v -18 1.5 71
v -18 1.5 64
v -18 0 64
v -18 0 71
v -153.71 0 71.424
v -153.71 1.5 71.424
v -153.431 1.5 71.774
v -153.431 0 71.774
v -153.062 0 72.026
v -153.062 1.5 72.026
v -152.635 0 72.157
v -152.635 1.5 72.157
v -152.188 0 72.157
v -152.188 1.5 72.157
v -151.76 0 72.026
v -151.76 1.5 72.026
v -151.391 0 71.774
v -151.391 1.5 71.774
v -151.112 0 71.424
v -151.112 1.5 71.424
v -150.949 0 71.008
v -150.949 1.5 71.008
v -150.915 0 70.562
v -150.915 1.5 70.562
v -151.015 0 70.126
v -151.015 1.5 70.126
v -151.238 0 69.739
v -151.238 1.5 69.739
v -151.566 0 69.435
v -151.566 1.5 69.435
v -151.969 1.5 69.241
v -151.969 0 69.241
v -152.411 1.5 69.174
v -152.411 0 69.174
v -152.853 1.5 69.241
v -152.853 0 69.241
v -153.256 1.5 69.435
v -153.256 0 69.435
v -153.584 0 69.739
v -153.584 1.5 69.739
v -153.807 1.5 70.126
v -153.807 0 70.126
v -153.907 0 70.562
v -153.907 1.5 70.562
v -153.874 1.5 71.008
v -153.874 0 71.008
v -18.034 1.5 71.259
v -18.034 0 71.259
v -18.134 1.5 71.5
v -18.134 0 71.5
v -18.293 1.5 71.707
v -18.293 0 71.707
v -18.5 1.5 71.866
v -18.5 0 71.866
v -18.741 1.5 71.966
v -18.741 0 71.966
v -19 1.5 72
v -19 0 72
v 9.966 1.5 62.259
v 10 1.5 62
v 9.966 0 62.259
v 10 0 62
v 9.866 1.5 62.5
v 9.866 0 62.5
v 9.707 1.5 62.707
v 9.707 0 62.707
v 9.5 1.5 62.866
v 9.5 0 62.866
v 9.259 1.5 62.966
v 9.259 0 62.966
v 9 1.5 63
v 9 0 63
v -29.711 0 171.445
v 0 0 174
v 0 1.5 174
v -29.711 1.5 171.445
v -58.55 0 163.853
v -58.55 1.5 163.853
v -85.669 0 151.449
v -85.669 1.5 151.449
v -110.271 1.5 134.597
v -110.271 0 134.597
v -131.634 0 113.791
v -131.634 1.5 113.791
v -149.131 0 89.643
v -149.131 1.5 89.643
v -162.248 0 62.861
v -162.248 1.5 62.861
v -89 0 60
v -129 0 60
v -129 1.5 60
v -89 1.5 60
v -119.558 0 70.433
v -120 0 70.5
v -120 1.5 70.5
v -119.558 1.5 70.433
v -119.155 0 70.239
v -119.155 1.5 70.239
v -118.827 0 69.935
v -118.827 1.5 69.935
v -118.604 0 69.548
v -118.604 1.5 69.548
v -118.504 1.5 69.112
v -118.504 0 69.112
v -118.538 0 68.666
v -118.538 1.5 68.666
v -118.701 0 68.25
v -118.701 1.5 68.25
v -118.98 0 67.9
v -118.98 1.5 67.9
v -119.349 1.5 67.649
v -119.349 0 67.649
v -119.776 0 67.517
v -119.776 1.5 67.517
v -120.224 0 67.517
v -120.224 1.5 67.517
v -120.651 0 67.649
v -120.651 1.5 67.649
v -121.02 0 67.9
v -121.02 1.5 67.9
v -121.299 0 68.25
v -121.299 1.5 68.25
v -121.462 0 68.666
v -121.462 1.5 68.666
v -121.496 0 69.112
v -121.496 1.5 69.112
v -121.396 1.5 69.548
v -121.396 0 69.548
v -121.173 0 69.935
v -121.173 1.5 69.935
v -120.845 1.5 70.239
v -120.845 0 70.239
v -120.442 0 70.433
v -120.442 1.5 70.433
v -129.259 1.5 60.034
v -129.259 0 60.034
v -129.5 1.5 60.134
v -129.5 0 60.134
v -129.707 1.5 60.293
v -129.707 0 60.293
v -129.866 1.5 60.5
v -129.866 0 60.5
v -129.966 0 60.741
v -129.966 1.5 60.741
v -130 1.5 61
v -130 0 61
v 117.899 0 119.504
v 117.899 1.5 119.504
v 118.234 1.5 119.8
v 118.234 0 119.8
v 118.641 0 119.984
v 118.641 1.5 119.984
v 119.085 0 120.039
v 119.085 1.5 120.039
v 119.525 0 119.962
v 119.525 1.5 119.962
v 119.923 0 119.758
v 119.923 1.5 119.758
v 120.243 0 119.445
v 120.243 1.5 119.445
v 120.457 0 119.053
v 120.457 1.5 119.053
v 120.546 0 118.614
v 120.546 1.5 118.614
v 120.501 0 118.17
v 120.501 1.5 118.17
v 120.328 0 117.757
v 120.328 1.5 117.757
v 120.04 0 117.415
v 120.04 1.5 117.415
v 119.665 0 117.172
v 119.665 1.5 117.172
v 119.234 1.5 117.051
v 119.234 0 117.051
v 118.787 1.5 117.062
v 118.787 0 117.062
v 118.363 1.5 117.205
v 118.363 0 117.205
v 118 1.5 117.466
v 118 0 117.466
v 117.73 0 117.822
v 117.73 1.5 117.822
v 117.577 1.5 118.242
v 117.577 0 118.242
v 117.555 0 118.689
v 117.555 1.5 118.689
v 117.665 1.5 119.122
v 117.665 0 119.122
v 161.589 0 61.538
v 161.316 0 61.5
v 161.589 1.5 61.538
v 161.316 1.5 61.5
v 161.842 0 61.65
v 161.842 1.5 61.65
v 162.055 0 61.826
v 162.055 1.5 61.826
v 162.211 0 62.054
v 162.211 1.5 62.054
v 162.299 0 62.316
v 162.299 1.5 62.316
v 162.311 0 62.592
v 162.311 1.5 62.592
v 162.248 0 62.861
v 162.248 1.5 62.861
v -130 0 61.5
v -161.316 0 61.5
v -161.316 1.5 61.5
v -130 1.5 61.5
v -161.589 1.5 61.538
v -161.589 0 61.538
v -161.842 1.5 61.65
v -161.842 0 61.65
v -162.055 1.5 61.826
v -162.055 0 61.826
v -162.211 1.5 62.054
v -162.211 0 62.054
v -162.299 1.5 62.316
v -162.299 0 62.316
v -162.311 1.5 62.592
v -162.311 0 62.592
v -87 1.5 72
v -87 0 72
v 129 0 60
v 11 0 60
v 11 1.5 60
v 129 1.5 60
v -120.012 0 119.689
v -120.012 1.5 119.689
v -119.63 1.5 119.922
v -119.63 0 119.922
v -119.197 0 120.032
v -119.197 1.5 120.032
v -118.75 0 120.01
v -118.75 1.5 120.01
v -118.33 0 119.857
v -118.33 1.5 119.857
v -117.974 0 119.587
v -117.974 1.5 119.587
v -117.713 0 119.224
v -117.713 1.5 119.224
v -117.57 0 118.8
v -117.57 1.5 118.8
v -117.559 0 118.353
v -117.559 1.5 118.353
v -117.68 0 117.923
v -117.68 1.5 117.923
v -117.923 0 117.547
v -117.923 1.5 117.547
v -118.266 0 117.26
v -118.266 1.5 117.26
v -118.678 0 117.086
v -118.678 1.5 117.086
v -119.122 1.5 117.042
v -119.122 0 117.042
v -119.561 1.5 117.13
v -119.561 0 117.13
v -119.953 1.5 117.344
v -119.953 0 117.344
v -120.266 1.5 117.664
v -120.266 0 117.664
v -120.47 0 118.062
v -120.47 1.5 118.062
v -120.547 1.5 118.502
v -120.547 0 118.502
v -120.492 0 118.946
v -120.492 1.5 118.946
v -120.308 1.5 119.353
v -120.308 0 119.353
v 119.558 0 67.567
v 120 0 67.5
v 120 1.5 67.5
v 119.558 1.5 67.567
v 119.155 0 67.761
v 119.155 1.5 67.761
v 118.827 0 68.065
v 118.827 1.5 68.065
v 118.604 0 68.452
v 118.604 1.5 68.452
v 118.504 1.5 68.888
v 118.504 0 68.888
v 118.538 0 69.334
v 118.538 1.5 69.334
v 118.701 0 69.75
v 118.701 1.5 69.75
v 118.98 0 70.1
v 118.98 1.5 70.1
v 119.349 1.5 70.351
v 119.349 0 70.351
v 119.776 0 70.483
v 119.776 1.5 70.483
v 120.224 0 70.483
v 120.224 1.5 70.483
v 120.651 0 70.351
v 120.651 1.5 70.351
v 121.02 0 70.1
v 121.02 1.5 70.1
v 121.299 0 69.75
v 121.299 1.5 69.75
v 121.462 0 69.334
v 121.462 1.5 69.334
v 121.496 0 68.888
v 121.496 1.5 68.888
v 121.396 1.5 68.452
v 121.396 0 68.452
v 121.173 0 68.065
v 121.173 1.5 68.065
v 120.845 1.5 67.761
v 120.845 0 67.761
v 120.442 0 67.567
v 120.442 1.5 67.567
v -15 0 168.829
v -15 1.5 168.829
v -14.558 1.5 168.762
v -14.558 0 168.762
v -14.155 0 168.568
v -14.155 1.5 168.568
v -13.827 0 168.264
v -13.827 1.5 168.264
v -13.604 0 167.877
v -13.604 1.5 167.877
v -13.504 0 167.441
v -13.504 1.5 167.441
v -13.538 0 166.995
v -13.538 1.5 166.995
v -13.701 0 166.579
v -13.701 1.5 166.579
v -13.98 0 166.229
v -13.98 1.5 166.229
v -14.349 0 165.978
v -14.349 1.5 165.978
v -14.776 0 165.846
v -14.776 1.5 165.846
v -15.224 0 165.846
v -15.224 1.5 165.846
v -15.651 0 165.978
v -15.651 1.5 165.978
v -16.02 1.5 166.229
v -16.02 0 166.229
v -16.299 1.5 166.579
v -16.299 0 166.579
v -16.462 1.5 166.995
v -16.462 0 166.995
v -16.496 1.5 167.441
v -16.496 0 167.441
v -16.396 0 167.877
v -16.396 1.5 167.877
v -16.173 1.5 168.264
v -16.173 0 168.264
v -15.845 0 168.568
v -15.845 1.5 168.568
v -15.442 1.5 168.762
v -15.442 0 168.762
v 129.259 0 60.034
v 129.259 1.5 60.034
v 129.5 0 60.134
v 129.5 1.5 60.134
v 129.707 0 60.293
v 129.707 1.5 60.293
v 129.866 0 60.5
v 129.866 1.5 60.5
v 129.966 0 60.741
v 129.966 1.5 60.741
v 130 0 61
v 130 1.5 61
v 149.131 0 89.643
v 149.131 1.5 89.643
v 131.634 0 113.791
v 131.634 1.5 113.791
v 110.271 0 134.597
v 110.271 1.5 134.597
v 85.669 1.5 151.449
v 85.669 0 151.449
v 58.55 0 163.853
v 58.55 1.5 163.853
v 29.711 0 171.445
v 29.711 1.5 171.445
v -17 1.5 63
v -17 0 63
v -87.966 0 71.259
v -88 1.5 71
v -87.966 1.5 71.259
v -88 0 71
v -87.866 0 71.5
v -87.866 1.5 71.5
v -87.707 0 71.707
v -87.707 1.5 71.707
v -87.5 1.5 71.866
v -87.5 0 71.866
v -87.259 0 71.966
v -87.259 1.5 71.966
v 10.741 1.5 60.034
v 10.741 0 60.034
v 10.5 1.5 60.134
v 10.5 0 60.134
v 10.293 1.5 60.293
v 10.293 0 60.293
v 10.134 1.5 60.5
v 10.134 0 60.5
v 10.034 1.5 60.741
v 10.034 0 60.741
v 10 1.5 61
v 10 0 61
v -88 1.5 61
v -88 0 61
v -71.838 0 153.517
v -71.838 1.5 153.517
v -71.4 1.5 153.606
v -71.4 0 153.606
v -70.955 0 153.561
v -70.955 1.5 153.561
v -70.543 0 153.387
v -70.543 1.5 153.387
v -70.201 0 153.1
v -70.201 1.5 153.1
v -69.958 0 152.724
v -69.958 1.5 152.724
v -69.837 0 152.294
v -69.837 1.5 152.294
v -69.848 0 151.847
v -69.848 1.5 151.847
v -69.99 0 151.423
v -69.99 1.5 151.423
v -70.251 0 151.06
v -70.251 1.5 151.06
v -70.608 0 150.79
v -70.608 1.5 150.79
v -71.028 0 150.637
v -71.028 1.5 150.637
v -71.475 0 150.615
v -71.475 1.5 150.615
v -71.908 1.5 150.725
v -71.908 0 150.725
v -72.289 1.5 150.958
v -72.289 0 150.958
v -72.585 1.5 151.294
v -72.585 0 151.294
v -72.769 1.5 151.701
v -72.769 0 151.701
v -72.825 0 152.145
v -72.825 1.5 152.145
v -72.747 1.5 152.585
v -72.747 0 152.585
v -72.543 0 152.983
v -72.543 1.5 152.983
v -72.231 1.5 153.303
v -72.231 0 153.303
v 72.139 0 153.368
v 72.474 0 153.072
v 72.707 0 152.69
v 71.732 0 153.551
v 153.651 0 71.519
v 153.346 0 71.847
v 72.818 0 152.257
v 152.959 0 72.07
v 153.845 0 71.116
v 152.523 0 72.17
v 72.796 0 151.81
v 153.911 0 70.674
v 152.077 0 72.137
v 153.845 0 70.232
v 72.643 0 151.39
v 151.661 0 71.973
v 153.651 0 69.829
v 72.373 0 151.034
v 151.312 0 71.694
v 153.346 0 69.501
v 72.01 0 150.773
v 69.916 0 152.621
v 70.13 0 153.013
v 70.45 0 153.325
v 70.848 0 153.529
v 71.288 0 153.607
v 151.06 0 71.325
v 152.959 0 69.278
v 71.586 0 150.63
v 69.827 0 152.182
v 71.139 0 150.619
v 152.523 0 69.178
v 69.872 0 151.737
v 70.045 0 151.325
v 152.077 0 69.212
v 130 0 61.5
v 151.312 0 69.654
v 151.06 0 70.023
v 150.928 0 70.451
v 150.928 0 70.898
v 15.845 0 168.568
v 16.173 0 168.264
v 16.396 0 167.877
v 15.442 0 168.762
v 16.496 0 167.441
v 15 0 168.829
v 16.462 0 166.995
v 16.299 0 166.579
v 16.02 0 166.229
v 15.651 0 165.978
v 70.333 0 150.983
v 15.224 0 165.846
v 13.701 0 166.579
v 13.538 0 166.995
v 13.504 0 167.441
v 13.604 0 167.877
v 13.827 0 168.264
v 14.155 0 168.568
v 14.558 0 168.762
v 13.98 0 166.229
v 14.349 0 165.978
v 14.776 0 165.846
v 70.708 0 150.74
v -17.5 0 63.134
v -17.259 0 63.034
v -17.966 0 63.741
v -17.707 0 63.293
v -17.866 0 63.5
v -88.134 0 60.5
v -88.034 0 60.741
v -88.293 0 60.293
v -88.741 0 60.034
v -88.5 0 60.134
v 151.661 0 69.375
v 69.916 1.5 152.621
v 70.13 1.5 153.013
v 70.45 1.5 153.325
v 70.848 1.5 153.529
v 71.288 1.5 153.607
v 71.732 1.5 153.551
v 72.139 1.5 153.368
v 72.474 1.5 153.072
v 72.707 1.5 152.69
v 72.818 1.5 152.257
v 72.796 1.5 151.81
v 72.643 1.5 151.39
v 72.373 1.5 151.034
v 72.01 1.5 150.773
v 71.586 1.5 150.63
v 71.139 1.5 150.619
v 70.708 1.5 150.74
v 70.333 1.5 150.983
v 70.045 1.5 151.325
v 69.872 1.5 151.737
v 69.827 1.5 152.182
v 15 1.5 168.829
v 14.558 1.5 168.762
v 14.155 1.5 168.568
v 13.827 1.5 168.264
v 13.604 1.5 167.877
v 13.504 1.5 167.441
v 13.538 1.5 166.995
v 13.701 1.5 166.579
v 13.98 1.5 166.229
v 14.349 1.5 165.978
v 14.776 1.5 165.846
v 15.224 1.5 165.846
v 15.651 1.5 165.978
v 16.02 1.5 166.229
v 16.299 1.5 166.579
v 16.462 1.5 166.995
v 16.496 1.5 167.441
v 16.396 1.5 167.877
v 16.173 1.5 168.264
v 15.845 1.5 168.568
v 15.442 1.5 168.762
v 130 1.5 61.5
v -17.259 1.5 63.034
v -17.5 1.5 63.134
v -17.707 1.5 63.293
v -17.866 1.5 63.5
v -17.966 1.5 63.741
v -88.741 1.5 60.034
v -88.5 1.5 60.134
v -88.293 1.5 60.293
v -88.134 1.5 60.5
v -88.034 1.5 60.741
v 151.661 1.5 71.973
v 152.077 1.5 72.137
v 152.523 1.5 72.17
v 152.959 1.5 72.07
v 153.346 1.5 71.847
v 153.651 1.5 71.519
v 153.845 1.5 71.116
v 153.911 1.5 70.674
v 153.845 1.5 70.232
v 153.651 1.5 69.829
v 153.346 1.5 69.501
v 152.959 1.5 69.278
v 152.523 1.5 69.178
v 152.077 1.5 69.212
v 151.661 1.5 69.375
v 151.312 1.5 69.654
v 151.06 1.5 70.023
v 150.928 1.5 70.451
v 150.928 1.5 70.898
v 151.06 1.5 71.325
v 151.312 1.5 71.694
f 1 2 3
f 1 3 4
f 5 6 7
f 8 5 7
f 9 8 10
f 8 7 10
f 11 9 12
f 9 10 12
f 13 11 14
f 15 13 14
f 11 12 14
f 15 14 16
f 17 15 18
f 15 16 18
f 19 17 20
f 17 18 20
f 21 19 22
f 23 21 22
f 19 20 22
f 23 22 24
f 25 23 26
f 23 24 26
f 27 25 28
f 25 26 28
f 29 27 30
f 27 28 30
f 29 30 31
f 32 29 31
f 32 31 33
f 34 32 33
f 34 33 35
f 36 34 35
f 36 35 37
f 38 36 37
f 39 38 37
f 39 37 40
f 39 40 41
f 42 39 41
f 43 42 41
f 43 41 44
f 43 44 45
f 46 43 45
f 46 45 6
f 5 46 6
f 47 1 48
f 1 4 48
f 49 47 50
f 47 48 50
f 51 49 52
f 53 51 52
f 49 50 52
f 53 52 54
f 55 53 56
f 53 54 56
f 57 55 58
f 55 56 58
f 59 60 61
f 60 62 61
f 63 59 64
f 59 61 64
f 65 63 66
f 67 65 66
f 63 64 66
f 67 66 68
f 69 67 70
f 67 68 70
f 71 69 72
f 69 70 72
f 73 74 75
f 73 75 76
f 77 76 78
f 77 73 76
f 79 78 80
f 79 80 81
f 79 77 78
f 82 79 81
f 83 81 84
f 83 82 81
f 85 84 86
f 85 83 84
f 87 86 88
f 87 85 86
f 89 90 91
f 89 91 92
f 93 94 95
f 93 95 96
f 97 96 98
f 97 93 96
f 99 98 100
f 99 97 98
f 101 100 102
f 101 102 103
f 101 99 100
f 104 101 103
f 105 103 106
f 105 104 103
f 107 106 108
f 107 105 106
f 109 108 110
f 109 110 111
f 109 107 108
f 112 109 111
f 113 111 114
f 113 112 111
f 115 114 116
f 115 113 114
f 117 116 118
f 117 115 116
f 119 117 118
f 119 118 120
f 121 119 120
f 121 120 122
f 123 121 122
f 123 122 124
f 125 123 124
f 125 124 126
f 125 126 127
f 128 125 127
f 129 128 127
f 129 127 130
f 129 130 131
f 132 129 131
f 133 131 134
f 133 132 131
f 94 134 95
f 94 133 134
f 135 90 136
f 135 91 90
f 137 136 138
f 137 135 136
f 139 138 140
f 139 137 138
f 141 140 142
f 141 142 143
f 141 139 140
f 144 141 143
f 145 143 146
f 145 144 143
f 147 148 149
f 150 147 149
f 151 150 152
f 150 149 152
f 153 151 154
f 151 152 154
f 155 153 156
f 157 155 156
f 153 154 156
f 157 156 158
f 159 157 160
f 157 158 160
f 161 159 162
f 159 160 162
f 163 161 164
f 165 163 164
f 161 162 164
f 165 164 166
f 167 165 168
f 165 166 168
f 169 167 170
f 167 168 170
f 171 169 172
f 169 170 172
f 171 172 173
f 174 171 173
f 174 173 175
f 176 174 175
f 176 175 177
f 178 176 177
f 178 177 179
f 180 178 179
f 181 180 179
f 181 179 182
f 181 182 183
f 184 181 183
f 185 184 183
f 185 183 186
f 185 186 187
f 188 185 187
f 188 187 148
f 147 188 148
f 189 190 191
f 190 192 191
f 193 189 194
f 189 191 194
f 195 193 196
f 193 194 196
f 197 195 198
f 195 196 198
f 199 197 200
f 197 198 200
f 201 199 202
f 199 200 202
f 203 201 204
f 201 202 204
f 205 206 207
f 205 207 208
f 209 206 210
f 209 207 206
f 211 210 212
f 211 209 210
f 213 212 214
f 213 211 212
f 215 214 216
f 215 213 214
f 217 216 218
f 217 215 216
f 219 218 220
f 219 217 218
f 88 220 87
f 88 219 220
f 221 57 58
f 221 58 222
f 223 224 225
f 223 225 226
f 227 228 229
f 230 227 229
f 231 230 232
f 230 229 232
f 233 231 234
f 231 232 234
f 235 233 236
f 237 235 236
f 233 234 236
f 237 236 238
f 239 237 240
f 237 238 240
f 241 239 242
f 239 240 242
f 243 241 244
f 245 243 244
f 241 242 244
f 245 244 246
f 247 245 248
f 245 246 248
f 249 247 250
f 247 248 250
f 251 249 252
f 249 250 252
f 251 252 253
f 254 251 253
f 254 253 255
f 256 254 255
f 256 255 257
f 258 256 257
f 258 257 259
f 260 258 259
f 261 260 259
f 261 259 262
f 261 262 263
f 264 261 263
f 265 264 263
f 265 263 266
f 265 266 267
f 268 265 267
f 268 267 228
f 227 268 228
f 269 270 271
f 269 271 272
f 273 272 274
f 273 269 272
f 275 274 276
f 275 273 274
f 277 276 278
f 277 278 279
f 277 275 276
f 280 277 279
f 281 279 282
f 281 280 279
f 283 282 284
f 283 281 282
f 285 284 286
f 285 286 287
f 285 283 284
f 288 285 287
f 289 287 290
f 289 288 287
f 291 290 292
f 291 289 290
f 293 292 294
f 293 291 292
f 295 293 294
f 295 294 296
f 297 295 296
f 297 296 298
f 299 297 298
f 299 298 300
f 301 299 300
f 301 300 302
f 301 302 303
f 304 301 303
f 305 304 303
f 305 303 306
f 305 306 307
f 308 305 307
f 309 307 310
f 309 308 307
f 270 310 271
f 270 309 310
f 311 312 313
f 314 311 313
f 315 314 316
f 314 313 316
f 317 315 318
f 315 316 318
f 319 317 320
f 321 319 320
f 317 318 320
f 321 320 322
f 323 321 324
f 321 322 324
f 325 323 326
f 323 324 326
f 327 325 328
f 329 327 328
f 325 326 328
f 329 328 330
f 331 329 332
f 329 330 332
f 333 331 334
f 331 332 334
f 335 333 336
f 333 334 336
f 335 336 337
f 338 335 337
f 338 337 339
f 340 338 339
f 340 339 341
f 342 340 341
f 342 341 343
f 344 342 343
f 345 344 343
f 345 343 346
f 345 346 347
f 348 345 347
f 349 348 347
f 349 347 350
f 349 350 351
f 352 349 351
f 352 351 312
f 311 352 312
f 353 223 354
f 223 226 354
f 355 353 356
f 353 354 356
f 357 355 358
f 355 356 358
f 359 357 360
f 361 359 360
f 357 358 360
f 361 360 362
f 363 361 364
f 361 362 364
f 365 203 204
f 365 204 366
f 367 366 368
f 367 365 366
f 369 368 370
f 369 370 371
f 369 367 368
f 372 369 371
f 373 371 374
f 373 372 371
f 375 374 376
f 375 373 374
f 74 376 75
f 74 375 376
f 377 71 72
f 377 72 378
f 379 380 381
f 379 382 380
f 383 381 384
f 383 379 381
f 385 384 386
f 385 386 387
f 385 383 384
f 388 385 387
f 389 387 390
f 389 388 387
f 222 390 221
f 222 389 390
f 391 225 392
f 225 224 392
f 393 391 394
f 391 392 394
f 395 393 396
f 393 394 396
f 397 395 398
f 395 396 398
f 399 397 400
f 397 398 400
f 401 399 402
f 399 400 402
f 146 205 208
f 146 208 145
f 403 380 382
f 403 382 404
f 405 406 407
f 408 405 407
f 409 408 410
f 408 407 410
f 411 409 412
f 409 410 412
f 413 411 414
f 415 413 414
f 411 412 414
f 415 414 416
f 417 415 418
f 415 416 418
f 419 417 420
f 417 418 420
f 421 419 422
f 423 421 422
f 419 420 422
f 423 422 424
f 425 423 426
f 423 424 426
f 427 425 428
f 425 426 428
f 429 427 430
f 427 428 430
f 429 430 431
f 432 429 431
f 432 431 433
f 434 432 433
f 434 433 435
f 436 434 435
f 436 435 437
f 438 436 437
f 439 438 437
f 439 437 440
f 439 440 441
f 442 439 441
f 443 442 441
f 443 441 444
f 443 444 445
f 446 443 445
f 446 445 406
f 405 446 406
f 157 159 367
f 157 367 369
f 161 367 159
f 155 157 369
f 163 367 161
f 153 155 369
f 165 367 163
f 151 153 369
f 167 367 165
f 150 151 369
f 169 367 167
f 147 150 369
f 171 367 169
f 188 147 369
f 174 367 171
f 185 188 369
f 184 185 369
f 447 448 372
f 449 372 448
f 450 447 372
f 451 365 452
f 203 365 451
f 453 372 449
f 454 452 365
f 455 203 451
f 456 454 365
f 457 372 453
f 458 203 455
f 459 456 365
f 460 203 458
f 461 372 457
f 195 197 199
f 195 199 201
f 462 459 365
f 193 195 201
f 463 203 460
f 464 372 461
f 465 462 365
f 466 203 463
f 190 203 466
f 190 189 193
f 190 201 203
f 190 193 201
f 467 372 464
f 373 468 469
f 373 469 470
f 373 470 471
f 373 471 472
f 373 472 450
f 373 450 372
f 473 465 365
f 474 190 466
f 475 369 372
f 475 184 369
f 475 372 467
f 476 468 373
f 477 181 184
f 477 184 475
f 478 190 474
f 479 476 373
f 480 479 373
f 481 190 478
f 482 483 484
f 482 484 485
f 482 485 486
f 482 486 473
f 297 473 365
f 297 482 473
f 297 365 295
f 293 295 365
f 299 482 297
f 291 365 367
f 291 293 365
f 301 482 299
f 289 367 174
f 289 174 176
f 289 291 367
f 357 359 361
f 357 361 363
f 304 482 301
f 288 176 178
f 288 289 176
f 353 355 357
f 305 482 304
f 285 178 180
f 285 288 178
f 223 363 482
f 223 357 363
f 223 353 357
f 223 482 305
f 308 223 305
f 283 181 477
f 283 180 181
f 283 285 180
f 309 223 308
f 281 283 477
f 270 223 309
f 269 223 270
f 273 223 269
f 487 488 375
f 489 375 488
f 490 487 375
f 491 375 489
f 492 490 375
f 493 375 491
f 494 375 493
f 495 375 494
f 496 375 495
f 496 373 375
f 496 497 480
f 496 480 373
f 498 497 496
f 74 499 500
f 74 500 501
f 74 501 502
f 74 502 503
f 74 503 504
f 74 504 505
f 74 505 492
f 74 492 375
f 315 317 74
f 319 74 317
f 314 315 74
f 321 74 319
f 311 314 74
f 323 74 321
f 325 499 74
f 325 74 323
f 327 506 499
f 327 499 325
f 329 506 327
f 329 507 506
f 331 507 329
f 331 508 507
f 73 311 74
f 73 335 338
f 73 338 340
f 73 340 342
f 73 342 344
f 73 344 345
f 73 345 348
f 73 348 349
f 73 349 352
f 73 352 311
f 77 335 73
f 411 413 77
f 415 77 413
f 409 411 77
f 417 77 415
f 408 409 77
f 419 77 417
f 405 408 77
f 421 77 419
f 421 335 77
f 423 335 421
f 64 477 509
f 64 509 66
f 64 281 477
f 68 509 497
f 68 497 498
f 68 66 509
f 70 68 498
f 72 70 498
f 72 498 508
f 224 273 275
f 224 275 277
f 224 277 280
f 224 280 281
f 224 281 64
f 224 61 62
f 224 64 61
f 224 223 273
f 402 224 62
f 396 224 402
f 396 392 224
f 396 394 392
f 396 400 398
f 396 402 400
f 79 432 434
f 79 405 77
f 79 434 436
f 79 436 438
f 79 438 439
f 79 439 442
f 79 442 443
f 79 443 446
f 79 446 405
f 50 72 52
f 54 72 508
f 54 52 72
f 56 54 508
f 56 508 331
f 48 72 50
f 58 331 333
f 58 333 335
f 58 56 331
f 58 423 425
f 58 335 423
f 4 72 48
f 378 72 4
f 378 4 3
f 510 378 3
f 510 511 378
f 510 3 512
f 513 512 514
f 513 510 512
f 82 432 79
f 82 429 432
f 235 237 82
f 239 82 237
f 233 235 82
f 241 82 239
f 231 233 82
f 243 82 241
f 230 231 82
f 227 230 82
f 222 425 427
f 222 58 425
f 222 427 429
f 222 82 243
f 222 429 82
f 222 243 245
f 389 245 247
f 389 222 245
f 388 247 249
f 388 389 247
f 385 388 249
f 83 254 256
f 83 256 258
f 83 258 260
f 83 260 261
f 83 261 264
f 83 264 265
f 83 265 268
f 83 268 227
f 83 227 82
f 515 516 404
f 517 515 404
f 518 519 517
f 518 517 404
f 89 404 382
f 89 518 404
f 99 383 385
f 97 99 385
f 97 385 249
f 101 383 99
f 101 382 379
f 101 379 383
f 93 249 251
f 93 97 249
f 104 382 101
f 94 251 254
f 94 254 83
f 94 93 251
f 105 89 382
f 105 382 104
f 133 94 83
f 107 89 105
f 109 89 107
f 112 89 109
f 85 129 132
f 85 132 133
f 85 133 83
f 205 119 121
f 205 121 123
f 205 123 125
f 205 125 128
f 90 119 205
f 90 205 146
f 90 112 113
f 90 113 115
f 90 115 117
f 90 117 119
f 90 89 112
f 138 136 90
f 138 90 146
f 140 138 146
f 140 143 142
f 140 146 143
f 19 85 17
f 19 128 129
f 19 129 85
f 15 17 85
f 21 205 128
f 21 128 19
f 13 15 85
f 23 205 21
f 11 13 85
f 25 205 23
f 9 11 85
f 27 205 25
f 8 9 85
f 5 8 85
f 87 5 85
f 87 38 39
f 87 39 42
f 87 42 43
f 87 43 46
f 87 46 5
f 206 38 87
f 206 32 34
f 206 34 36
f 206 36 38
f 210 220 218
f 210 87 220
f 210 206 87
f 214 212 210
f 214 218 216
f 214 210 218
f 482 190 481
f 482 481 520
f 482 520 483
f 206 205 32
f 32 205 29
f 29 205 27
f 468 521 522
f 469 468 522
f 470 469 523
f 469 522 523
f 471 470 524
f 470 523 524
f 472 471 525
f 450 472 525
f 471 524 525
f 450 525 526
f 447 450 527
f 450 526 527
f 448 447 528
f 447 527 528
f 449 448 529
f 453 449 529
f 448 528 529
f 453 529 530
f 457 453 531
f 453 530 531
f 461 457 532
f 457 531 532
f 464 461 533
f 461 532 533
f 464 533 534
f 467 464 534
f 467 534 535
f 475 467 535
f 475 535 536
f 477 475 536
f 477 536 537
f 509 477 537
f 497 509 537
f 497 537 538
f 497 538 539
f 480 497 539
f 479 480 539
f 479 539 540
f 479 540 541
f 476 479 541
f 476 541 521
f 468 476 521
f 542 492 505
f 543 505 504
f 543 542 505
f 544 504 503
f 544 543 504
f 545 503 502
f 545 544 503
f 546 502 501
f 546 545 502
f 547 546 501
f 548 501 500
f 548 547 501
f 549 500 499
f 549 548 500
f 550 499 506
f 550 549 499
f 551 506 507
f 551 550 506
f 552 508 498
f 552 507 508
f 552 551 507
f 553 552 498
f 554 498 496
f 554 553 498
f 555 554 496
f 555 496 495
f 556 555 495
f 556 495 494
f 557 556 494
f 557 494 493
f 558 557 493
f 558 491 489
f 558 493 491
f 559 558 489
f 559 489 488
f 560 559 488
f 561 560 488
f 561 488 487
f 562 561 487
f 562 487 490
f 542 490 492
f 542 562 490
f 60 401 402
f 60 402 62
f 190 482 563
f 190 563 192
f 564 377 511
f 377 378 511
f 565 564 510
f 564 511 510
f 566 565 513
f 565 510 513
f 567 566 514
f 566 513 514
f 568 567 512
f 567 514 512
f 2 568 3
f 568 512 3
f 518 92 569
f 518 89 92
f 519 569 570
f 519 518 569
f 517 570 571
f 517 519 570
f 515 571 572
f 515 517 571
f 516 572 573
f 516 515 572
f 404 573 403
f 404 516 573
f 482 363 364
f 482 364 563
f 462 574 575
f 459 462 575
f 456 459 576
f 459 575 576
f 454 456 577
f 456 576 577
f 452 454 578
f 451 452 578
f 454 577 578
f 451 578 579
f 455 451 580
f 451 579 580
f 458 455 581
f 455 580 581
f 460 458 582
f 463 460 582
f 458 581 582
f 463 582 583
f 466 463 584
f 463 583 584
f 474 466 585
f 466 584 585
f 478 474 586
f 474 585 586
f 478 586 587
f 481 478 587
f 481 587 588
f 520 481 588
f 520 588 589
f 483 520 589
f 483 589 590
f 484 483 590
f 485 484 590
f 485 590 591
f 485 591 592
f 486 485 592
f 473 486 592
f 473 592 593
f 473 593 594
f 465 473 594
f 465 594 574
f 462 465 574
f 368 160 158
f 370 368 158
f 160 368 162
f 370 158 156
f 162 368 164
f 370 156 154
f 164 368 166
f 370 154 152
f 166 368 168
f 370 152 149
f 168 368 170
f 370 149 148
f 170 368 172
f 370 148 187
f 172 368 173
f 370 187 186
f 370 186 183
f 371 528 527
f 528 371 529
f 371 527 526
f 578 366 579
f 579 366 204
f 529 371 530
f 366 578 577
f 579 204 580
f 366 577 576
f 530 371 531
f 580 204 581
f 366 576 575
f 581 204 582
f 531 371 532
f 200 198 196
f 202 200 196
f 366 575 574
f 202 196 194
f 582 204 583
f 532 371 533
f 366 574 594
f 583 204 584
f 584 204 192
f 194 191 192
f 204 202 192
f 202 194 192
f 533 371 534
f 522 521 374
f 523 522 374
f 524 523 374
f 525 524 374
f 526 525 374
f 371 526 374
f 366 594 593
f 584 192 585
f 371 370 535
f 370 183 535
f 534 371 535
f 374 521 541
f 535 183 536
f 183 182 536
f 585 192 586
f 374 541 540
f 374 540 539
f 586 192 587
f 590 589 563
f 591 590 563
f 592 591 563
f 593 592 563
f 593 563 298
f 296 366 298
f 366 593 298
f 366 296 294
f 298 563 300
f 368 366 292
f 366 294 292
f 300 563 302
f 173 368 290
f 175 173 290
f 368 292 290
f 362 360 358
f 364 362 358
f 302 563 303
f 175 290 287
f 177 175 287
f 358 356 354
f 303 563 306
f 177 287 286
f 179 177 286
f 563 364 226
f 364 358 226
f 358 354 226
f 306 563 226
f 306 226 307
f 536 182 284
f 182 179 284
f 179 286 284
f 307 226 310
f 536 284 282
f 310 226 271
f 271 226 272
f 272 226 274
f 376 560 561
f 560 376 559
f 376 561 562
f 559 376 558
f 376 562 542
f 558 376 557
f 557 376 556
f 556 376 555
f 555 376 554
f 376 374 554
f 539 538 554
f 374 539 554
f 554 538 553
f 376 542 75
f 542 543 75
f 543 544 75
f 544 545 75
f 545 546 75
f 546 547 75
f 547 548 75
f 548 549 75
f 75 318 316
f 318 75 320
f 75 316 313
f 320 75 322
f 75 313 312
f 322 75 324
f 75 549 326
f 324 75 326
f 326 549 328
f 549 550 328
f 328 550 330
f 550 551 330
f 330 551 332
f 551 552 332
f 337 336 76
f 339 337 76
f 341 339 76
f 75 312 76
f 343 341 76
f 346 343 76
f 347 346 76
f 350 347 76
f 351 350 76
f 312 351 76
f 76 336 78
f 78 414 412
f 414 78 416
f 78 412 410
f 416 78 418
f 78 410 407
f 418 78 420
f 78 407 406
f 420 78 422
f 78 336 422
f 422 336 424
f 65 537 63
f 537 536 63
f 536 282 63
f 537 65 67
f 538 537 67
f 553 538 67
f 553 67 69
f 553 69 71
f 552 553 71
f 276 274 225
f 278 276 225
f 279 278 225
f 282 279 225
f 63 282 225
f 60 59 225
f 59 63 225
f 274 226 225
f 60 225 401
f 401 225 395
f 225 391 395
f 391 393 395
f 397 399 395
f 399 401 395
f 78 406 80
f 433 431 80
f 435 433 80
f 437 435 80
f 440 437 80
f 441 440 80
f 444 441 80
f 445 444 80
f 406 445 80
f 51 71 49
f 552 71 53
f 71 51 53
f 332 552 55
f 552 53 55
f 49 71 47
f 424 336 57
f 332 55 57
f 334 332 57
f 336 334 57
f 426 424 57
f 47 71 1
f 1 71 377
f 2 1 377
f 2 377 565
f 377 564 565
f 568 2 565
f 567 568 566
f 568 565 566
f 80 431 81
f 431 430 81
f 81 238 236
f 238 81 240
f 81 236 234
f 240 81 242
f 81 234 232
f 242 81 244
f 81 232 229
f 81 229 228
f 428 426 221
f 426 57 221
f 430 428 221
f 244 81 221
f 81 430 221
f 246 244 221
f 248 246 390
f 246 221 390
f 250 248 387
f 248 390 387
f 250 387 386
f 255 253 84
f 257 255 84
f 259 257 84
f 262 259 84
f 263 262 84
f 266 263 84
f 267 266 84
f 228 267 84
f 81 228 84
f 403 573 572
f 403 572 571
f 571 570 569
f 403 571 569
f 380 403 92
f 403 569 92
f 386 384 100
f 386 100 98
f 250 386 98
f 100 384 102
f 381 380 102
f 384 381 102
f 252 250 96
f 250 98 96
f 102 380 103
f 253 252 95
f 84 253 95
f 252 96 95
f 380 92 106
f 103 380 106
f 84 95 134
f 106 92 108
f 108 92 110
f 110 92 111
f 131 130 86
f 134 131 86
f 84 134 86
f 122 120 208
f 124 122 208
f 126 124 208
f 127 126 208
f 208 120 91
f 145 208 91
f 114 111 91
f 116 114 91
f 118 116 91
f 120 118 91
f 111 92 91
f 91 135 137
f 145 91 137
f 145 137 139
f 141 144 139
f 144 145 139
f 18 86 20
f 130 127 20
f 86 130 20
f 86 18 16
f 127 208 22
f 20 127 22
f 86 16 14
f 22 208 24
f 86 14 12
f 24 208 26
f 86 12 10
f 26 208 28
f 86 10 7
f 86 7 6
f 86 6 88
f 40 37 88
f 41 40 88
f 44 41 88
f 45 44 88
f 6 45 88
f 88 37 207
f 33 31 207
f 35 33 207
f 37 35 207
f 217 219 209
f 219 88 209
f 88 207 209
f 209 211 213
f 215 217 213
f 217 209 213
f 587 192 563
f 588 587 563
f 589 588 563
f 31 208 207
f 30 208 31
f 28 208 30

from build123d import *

# Parameters (mm, degrees)
ESQUISSE1_R                  = 1.5
BOSS_EXTRU_1_DEPTH           = 1.5
CONG_2_R                     = 1
ESQUISSE2_R                  = 1.5
ENL_V_MAT_EXTRU_1_DEPTH      = 238.959306119
R_P_TITION_CIRCULAIRE1_COUNT = 4
R_P_TITION_CIRCULAIRE1_ANGLE = 60
SYM_TRIE1_COPY_1_SKETCH_R    = 1.5
SYM_TRIE1_COPY_1_DEPTH       = 238.959306119
SYM_TRIE1_COPY_2_SKETCH_R    = 1.5
SYM_TRIE1_COPY_2_DEPTH       = 238.959306119
SYM_TRIE1_COPY_3_SKETCH_R    = 1.5
SYM_TRIE1_COPY_3_DEPTH       = 238.959306119
ENL_V_MAT_EXTRU_2_DEPTH      = 238.959306119
CONG_3_R                     = 1


with BuildPart() as part:
    # Esquisse1 → Boss.-Extru.1 (new body)
    with BuildSketch(Plane(origin=(0, 0, 0), x_dir=(1, 0, 0), z_dir=(0, 1, 0))):
        with BuildLine():
            Line((-130, -60), (130, -60))
            Line((130, -60), (130, -61.5))
            Line((130, -61.5), (162.769008107, -61.5))
            ThreePointArc((162.769008107, -61.5), (98.931794687, -143.138045257), (0, -174))
            ThreePointArc((0, -174), (-98.931794687, -143.138045257), (-162.769008107, -61.5))
            Line((-162.769008107, -61.5), (-130, -61.5))
            Line((-130, -61.5), (-130, -60))
        make_face()
        with Locations(Location((-120, -69, 0), (0, 0, 270))):
            Circle(ESQUISSE1_R, mode=Mode.SUBTRACT)
        with Locations(Location((120, -69, 0), (0, 0, 90))):
            Circle(ESQUISSE1_R, mode=Mode.SUBTRACT)
    extrude(amount=BOSS_EXTRU_1_DEPTH)

    # Congé2
    cong_2_edges = [part.edges().sort_by_distance(p)[0] for p in [
        (-130, 0.75, 60),
        (130, 0.75, 60),
        (162.769008107, 0.75, 61.5),
        (-162.769008107, 0.75, 61.5),
    ]]
    fillet(cong_2_edges, radius=CONG_2_R)

    # Esquisse2 → Enlèv. mat.-Extru.1 (cut, through all)
    with BuildSketch(Plane(origin=(0, 1.5, 0), x_dir=(1, 0, 0), z_dir=(0, 1, 0))):
        with Locations(Location((-15, -167.329017209, 0), (0, 0, 270))):
            Circle(ESQUISSE2_R)
    enl_v_mat_extru_1 = extrude(amount=-ENL_V_MAT_EXTRU_1_DEPTH, mode=Mode.SUBTRACT)

    # Répétition circulaire1: Enlèv. mat.-Extru.1 ×4 about axis
    r_p_tition_circulaire1_axis = Axis((0, 0, 0), (0, -1, 0))
    for i in range(1, R_P_TITION_CIRCULAIRE1_COUNT):
        add(enl_v_mat_extru_1.rotate(r_p_tition_circulaire1_axis, i * R_P_TITION_CIRCULAIRE1_ANGLE / (R_P_TITION_CIRCULAIRE1_COUNT - 1)), mode=Mode.SUBTRACT)

    # Symétrie1: Enlèv. mat.-Extru.1 across plane
    add(enl_v_mat_extru_1.mirror(Plane(origin=(0, 0, 0), x_dir=(0, 0, 1), z_dir=(1, 0, 0))), mode=Mode.SUBTRACT)

    # Symétrie1 copy 1 sketch → Symétrie1 copy 1 (cut, through all)
    with BuildSketch(Plane(origin=(0, 1.5, 0), x_dir=(-0.9396926207859081, 0, 0.3420201433256695), z_dir=(0, 1, 0))):
        with Locations((-15, 167.329017209)):
            Circle(SYM_TRIE1_COPY_1_SKETCH_R)
    extrude(amount=-SYM_TRIE1_COPY_1_DEPTH, mode=Mode.SUBTRACT)

    # Symétrie1 copy 2 sketch → Symétrie1 copy 2 (cut, through all)
    with BuildSketch(Plane(origin=(0, 1.5, 0), x_dir=(-0.766044443118977, 0, 0.6427876096865406), z_dir=(0, 1, 0))):
        with Locations((-15, 167.329017209)):
            Circle(SYM_TRIE1_COPY_2_SKETCH_R)
    extrude(amount=-SYM_TRIE1_COPY_2_DEPTH, mode=Mode.SUBTRACT)

    # Symétrie1 copy 3 sketch → Symétrie1 copy 3 (cut, through all)
    with BuildSketch(Plane(origin=(0, 1.5, 0), x_dir=(-0.4999999999999978, 0, 0.8660254037844399), z_dir=(0, 1, 0))):
        with Locations((-15, 167.329017209)):
            Circle(SYM_TRIE1_COPY_3_SKETCH_R)
    extrude(amount=-SYM_TRIE1_COPY_3_DEPTH, mode=Mode.SUBTRACT)

    # Esquisse3 → Enlèv. mat.-Extru.2 (cut, through all)
    with BuildSketch(Plane(origin=(0, 1.5, 0), x_dir=(1, 0, 0), z_dir=(0, 1, 0))):
        Polygon((-88, -60), (10, -60), (10, -63), (-18, -63), (-18, -72), (-88, -72), align=None)
    extrude(amount=-ENL_V_MAT_EXTRU_2_DEPTH, mode=Mode.SUBTRACT)

    # Congé3
    cong_3_edges = [part.edges().sort_by_distance(p)[0] for p in [
        (-18, 0.75, 72),
        (-88, 0.75, 72),
        (-88, 0.75, 60),
        (10, 0.75, 60),
        (10, 0.75, 63),
        (-18, 0.75, 63),
    ]]
    fillet(cong_3_edges, radius=CONG_3_R)


solid = part.part
